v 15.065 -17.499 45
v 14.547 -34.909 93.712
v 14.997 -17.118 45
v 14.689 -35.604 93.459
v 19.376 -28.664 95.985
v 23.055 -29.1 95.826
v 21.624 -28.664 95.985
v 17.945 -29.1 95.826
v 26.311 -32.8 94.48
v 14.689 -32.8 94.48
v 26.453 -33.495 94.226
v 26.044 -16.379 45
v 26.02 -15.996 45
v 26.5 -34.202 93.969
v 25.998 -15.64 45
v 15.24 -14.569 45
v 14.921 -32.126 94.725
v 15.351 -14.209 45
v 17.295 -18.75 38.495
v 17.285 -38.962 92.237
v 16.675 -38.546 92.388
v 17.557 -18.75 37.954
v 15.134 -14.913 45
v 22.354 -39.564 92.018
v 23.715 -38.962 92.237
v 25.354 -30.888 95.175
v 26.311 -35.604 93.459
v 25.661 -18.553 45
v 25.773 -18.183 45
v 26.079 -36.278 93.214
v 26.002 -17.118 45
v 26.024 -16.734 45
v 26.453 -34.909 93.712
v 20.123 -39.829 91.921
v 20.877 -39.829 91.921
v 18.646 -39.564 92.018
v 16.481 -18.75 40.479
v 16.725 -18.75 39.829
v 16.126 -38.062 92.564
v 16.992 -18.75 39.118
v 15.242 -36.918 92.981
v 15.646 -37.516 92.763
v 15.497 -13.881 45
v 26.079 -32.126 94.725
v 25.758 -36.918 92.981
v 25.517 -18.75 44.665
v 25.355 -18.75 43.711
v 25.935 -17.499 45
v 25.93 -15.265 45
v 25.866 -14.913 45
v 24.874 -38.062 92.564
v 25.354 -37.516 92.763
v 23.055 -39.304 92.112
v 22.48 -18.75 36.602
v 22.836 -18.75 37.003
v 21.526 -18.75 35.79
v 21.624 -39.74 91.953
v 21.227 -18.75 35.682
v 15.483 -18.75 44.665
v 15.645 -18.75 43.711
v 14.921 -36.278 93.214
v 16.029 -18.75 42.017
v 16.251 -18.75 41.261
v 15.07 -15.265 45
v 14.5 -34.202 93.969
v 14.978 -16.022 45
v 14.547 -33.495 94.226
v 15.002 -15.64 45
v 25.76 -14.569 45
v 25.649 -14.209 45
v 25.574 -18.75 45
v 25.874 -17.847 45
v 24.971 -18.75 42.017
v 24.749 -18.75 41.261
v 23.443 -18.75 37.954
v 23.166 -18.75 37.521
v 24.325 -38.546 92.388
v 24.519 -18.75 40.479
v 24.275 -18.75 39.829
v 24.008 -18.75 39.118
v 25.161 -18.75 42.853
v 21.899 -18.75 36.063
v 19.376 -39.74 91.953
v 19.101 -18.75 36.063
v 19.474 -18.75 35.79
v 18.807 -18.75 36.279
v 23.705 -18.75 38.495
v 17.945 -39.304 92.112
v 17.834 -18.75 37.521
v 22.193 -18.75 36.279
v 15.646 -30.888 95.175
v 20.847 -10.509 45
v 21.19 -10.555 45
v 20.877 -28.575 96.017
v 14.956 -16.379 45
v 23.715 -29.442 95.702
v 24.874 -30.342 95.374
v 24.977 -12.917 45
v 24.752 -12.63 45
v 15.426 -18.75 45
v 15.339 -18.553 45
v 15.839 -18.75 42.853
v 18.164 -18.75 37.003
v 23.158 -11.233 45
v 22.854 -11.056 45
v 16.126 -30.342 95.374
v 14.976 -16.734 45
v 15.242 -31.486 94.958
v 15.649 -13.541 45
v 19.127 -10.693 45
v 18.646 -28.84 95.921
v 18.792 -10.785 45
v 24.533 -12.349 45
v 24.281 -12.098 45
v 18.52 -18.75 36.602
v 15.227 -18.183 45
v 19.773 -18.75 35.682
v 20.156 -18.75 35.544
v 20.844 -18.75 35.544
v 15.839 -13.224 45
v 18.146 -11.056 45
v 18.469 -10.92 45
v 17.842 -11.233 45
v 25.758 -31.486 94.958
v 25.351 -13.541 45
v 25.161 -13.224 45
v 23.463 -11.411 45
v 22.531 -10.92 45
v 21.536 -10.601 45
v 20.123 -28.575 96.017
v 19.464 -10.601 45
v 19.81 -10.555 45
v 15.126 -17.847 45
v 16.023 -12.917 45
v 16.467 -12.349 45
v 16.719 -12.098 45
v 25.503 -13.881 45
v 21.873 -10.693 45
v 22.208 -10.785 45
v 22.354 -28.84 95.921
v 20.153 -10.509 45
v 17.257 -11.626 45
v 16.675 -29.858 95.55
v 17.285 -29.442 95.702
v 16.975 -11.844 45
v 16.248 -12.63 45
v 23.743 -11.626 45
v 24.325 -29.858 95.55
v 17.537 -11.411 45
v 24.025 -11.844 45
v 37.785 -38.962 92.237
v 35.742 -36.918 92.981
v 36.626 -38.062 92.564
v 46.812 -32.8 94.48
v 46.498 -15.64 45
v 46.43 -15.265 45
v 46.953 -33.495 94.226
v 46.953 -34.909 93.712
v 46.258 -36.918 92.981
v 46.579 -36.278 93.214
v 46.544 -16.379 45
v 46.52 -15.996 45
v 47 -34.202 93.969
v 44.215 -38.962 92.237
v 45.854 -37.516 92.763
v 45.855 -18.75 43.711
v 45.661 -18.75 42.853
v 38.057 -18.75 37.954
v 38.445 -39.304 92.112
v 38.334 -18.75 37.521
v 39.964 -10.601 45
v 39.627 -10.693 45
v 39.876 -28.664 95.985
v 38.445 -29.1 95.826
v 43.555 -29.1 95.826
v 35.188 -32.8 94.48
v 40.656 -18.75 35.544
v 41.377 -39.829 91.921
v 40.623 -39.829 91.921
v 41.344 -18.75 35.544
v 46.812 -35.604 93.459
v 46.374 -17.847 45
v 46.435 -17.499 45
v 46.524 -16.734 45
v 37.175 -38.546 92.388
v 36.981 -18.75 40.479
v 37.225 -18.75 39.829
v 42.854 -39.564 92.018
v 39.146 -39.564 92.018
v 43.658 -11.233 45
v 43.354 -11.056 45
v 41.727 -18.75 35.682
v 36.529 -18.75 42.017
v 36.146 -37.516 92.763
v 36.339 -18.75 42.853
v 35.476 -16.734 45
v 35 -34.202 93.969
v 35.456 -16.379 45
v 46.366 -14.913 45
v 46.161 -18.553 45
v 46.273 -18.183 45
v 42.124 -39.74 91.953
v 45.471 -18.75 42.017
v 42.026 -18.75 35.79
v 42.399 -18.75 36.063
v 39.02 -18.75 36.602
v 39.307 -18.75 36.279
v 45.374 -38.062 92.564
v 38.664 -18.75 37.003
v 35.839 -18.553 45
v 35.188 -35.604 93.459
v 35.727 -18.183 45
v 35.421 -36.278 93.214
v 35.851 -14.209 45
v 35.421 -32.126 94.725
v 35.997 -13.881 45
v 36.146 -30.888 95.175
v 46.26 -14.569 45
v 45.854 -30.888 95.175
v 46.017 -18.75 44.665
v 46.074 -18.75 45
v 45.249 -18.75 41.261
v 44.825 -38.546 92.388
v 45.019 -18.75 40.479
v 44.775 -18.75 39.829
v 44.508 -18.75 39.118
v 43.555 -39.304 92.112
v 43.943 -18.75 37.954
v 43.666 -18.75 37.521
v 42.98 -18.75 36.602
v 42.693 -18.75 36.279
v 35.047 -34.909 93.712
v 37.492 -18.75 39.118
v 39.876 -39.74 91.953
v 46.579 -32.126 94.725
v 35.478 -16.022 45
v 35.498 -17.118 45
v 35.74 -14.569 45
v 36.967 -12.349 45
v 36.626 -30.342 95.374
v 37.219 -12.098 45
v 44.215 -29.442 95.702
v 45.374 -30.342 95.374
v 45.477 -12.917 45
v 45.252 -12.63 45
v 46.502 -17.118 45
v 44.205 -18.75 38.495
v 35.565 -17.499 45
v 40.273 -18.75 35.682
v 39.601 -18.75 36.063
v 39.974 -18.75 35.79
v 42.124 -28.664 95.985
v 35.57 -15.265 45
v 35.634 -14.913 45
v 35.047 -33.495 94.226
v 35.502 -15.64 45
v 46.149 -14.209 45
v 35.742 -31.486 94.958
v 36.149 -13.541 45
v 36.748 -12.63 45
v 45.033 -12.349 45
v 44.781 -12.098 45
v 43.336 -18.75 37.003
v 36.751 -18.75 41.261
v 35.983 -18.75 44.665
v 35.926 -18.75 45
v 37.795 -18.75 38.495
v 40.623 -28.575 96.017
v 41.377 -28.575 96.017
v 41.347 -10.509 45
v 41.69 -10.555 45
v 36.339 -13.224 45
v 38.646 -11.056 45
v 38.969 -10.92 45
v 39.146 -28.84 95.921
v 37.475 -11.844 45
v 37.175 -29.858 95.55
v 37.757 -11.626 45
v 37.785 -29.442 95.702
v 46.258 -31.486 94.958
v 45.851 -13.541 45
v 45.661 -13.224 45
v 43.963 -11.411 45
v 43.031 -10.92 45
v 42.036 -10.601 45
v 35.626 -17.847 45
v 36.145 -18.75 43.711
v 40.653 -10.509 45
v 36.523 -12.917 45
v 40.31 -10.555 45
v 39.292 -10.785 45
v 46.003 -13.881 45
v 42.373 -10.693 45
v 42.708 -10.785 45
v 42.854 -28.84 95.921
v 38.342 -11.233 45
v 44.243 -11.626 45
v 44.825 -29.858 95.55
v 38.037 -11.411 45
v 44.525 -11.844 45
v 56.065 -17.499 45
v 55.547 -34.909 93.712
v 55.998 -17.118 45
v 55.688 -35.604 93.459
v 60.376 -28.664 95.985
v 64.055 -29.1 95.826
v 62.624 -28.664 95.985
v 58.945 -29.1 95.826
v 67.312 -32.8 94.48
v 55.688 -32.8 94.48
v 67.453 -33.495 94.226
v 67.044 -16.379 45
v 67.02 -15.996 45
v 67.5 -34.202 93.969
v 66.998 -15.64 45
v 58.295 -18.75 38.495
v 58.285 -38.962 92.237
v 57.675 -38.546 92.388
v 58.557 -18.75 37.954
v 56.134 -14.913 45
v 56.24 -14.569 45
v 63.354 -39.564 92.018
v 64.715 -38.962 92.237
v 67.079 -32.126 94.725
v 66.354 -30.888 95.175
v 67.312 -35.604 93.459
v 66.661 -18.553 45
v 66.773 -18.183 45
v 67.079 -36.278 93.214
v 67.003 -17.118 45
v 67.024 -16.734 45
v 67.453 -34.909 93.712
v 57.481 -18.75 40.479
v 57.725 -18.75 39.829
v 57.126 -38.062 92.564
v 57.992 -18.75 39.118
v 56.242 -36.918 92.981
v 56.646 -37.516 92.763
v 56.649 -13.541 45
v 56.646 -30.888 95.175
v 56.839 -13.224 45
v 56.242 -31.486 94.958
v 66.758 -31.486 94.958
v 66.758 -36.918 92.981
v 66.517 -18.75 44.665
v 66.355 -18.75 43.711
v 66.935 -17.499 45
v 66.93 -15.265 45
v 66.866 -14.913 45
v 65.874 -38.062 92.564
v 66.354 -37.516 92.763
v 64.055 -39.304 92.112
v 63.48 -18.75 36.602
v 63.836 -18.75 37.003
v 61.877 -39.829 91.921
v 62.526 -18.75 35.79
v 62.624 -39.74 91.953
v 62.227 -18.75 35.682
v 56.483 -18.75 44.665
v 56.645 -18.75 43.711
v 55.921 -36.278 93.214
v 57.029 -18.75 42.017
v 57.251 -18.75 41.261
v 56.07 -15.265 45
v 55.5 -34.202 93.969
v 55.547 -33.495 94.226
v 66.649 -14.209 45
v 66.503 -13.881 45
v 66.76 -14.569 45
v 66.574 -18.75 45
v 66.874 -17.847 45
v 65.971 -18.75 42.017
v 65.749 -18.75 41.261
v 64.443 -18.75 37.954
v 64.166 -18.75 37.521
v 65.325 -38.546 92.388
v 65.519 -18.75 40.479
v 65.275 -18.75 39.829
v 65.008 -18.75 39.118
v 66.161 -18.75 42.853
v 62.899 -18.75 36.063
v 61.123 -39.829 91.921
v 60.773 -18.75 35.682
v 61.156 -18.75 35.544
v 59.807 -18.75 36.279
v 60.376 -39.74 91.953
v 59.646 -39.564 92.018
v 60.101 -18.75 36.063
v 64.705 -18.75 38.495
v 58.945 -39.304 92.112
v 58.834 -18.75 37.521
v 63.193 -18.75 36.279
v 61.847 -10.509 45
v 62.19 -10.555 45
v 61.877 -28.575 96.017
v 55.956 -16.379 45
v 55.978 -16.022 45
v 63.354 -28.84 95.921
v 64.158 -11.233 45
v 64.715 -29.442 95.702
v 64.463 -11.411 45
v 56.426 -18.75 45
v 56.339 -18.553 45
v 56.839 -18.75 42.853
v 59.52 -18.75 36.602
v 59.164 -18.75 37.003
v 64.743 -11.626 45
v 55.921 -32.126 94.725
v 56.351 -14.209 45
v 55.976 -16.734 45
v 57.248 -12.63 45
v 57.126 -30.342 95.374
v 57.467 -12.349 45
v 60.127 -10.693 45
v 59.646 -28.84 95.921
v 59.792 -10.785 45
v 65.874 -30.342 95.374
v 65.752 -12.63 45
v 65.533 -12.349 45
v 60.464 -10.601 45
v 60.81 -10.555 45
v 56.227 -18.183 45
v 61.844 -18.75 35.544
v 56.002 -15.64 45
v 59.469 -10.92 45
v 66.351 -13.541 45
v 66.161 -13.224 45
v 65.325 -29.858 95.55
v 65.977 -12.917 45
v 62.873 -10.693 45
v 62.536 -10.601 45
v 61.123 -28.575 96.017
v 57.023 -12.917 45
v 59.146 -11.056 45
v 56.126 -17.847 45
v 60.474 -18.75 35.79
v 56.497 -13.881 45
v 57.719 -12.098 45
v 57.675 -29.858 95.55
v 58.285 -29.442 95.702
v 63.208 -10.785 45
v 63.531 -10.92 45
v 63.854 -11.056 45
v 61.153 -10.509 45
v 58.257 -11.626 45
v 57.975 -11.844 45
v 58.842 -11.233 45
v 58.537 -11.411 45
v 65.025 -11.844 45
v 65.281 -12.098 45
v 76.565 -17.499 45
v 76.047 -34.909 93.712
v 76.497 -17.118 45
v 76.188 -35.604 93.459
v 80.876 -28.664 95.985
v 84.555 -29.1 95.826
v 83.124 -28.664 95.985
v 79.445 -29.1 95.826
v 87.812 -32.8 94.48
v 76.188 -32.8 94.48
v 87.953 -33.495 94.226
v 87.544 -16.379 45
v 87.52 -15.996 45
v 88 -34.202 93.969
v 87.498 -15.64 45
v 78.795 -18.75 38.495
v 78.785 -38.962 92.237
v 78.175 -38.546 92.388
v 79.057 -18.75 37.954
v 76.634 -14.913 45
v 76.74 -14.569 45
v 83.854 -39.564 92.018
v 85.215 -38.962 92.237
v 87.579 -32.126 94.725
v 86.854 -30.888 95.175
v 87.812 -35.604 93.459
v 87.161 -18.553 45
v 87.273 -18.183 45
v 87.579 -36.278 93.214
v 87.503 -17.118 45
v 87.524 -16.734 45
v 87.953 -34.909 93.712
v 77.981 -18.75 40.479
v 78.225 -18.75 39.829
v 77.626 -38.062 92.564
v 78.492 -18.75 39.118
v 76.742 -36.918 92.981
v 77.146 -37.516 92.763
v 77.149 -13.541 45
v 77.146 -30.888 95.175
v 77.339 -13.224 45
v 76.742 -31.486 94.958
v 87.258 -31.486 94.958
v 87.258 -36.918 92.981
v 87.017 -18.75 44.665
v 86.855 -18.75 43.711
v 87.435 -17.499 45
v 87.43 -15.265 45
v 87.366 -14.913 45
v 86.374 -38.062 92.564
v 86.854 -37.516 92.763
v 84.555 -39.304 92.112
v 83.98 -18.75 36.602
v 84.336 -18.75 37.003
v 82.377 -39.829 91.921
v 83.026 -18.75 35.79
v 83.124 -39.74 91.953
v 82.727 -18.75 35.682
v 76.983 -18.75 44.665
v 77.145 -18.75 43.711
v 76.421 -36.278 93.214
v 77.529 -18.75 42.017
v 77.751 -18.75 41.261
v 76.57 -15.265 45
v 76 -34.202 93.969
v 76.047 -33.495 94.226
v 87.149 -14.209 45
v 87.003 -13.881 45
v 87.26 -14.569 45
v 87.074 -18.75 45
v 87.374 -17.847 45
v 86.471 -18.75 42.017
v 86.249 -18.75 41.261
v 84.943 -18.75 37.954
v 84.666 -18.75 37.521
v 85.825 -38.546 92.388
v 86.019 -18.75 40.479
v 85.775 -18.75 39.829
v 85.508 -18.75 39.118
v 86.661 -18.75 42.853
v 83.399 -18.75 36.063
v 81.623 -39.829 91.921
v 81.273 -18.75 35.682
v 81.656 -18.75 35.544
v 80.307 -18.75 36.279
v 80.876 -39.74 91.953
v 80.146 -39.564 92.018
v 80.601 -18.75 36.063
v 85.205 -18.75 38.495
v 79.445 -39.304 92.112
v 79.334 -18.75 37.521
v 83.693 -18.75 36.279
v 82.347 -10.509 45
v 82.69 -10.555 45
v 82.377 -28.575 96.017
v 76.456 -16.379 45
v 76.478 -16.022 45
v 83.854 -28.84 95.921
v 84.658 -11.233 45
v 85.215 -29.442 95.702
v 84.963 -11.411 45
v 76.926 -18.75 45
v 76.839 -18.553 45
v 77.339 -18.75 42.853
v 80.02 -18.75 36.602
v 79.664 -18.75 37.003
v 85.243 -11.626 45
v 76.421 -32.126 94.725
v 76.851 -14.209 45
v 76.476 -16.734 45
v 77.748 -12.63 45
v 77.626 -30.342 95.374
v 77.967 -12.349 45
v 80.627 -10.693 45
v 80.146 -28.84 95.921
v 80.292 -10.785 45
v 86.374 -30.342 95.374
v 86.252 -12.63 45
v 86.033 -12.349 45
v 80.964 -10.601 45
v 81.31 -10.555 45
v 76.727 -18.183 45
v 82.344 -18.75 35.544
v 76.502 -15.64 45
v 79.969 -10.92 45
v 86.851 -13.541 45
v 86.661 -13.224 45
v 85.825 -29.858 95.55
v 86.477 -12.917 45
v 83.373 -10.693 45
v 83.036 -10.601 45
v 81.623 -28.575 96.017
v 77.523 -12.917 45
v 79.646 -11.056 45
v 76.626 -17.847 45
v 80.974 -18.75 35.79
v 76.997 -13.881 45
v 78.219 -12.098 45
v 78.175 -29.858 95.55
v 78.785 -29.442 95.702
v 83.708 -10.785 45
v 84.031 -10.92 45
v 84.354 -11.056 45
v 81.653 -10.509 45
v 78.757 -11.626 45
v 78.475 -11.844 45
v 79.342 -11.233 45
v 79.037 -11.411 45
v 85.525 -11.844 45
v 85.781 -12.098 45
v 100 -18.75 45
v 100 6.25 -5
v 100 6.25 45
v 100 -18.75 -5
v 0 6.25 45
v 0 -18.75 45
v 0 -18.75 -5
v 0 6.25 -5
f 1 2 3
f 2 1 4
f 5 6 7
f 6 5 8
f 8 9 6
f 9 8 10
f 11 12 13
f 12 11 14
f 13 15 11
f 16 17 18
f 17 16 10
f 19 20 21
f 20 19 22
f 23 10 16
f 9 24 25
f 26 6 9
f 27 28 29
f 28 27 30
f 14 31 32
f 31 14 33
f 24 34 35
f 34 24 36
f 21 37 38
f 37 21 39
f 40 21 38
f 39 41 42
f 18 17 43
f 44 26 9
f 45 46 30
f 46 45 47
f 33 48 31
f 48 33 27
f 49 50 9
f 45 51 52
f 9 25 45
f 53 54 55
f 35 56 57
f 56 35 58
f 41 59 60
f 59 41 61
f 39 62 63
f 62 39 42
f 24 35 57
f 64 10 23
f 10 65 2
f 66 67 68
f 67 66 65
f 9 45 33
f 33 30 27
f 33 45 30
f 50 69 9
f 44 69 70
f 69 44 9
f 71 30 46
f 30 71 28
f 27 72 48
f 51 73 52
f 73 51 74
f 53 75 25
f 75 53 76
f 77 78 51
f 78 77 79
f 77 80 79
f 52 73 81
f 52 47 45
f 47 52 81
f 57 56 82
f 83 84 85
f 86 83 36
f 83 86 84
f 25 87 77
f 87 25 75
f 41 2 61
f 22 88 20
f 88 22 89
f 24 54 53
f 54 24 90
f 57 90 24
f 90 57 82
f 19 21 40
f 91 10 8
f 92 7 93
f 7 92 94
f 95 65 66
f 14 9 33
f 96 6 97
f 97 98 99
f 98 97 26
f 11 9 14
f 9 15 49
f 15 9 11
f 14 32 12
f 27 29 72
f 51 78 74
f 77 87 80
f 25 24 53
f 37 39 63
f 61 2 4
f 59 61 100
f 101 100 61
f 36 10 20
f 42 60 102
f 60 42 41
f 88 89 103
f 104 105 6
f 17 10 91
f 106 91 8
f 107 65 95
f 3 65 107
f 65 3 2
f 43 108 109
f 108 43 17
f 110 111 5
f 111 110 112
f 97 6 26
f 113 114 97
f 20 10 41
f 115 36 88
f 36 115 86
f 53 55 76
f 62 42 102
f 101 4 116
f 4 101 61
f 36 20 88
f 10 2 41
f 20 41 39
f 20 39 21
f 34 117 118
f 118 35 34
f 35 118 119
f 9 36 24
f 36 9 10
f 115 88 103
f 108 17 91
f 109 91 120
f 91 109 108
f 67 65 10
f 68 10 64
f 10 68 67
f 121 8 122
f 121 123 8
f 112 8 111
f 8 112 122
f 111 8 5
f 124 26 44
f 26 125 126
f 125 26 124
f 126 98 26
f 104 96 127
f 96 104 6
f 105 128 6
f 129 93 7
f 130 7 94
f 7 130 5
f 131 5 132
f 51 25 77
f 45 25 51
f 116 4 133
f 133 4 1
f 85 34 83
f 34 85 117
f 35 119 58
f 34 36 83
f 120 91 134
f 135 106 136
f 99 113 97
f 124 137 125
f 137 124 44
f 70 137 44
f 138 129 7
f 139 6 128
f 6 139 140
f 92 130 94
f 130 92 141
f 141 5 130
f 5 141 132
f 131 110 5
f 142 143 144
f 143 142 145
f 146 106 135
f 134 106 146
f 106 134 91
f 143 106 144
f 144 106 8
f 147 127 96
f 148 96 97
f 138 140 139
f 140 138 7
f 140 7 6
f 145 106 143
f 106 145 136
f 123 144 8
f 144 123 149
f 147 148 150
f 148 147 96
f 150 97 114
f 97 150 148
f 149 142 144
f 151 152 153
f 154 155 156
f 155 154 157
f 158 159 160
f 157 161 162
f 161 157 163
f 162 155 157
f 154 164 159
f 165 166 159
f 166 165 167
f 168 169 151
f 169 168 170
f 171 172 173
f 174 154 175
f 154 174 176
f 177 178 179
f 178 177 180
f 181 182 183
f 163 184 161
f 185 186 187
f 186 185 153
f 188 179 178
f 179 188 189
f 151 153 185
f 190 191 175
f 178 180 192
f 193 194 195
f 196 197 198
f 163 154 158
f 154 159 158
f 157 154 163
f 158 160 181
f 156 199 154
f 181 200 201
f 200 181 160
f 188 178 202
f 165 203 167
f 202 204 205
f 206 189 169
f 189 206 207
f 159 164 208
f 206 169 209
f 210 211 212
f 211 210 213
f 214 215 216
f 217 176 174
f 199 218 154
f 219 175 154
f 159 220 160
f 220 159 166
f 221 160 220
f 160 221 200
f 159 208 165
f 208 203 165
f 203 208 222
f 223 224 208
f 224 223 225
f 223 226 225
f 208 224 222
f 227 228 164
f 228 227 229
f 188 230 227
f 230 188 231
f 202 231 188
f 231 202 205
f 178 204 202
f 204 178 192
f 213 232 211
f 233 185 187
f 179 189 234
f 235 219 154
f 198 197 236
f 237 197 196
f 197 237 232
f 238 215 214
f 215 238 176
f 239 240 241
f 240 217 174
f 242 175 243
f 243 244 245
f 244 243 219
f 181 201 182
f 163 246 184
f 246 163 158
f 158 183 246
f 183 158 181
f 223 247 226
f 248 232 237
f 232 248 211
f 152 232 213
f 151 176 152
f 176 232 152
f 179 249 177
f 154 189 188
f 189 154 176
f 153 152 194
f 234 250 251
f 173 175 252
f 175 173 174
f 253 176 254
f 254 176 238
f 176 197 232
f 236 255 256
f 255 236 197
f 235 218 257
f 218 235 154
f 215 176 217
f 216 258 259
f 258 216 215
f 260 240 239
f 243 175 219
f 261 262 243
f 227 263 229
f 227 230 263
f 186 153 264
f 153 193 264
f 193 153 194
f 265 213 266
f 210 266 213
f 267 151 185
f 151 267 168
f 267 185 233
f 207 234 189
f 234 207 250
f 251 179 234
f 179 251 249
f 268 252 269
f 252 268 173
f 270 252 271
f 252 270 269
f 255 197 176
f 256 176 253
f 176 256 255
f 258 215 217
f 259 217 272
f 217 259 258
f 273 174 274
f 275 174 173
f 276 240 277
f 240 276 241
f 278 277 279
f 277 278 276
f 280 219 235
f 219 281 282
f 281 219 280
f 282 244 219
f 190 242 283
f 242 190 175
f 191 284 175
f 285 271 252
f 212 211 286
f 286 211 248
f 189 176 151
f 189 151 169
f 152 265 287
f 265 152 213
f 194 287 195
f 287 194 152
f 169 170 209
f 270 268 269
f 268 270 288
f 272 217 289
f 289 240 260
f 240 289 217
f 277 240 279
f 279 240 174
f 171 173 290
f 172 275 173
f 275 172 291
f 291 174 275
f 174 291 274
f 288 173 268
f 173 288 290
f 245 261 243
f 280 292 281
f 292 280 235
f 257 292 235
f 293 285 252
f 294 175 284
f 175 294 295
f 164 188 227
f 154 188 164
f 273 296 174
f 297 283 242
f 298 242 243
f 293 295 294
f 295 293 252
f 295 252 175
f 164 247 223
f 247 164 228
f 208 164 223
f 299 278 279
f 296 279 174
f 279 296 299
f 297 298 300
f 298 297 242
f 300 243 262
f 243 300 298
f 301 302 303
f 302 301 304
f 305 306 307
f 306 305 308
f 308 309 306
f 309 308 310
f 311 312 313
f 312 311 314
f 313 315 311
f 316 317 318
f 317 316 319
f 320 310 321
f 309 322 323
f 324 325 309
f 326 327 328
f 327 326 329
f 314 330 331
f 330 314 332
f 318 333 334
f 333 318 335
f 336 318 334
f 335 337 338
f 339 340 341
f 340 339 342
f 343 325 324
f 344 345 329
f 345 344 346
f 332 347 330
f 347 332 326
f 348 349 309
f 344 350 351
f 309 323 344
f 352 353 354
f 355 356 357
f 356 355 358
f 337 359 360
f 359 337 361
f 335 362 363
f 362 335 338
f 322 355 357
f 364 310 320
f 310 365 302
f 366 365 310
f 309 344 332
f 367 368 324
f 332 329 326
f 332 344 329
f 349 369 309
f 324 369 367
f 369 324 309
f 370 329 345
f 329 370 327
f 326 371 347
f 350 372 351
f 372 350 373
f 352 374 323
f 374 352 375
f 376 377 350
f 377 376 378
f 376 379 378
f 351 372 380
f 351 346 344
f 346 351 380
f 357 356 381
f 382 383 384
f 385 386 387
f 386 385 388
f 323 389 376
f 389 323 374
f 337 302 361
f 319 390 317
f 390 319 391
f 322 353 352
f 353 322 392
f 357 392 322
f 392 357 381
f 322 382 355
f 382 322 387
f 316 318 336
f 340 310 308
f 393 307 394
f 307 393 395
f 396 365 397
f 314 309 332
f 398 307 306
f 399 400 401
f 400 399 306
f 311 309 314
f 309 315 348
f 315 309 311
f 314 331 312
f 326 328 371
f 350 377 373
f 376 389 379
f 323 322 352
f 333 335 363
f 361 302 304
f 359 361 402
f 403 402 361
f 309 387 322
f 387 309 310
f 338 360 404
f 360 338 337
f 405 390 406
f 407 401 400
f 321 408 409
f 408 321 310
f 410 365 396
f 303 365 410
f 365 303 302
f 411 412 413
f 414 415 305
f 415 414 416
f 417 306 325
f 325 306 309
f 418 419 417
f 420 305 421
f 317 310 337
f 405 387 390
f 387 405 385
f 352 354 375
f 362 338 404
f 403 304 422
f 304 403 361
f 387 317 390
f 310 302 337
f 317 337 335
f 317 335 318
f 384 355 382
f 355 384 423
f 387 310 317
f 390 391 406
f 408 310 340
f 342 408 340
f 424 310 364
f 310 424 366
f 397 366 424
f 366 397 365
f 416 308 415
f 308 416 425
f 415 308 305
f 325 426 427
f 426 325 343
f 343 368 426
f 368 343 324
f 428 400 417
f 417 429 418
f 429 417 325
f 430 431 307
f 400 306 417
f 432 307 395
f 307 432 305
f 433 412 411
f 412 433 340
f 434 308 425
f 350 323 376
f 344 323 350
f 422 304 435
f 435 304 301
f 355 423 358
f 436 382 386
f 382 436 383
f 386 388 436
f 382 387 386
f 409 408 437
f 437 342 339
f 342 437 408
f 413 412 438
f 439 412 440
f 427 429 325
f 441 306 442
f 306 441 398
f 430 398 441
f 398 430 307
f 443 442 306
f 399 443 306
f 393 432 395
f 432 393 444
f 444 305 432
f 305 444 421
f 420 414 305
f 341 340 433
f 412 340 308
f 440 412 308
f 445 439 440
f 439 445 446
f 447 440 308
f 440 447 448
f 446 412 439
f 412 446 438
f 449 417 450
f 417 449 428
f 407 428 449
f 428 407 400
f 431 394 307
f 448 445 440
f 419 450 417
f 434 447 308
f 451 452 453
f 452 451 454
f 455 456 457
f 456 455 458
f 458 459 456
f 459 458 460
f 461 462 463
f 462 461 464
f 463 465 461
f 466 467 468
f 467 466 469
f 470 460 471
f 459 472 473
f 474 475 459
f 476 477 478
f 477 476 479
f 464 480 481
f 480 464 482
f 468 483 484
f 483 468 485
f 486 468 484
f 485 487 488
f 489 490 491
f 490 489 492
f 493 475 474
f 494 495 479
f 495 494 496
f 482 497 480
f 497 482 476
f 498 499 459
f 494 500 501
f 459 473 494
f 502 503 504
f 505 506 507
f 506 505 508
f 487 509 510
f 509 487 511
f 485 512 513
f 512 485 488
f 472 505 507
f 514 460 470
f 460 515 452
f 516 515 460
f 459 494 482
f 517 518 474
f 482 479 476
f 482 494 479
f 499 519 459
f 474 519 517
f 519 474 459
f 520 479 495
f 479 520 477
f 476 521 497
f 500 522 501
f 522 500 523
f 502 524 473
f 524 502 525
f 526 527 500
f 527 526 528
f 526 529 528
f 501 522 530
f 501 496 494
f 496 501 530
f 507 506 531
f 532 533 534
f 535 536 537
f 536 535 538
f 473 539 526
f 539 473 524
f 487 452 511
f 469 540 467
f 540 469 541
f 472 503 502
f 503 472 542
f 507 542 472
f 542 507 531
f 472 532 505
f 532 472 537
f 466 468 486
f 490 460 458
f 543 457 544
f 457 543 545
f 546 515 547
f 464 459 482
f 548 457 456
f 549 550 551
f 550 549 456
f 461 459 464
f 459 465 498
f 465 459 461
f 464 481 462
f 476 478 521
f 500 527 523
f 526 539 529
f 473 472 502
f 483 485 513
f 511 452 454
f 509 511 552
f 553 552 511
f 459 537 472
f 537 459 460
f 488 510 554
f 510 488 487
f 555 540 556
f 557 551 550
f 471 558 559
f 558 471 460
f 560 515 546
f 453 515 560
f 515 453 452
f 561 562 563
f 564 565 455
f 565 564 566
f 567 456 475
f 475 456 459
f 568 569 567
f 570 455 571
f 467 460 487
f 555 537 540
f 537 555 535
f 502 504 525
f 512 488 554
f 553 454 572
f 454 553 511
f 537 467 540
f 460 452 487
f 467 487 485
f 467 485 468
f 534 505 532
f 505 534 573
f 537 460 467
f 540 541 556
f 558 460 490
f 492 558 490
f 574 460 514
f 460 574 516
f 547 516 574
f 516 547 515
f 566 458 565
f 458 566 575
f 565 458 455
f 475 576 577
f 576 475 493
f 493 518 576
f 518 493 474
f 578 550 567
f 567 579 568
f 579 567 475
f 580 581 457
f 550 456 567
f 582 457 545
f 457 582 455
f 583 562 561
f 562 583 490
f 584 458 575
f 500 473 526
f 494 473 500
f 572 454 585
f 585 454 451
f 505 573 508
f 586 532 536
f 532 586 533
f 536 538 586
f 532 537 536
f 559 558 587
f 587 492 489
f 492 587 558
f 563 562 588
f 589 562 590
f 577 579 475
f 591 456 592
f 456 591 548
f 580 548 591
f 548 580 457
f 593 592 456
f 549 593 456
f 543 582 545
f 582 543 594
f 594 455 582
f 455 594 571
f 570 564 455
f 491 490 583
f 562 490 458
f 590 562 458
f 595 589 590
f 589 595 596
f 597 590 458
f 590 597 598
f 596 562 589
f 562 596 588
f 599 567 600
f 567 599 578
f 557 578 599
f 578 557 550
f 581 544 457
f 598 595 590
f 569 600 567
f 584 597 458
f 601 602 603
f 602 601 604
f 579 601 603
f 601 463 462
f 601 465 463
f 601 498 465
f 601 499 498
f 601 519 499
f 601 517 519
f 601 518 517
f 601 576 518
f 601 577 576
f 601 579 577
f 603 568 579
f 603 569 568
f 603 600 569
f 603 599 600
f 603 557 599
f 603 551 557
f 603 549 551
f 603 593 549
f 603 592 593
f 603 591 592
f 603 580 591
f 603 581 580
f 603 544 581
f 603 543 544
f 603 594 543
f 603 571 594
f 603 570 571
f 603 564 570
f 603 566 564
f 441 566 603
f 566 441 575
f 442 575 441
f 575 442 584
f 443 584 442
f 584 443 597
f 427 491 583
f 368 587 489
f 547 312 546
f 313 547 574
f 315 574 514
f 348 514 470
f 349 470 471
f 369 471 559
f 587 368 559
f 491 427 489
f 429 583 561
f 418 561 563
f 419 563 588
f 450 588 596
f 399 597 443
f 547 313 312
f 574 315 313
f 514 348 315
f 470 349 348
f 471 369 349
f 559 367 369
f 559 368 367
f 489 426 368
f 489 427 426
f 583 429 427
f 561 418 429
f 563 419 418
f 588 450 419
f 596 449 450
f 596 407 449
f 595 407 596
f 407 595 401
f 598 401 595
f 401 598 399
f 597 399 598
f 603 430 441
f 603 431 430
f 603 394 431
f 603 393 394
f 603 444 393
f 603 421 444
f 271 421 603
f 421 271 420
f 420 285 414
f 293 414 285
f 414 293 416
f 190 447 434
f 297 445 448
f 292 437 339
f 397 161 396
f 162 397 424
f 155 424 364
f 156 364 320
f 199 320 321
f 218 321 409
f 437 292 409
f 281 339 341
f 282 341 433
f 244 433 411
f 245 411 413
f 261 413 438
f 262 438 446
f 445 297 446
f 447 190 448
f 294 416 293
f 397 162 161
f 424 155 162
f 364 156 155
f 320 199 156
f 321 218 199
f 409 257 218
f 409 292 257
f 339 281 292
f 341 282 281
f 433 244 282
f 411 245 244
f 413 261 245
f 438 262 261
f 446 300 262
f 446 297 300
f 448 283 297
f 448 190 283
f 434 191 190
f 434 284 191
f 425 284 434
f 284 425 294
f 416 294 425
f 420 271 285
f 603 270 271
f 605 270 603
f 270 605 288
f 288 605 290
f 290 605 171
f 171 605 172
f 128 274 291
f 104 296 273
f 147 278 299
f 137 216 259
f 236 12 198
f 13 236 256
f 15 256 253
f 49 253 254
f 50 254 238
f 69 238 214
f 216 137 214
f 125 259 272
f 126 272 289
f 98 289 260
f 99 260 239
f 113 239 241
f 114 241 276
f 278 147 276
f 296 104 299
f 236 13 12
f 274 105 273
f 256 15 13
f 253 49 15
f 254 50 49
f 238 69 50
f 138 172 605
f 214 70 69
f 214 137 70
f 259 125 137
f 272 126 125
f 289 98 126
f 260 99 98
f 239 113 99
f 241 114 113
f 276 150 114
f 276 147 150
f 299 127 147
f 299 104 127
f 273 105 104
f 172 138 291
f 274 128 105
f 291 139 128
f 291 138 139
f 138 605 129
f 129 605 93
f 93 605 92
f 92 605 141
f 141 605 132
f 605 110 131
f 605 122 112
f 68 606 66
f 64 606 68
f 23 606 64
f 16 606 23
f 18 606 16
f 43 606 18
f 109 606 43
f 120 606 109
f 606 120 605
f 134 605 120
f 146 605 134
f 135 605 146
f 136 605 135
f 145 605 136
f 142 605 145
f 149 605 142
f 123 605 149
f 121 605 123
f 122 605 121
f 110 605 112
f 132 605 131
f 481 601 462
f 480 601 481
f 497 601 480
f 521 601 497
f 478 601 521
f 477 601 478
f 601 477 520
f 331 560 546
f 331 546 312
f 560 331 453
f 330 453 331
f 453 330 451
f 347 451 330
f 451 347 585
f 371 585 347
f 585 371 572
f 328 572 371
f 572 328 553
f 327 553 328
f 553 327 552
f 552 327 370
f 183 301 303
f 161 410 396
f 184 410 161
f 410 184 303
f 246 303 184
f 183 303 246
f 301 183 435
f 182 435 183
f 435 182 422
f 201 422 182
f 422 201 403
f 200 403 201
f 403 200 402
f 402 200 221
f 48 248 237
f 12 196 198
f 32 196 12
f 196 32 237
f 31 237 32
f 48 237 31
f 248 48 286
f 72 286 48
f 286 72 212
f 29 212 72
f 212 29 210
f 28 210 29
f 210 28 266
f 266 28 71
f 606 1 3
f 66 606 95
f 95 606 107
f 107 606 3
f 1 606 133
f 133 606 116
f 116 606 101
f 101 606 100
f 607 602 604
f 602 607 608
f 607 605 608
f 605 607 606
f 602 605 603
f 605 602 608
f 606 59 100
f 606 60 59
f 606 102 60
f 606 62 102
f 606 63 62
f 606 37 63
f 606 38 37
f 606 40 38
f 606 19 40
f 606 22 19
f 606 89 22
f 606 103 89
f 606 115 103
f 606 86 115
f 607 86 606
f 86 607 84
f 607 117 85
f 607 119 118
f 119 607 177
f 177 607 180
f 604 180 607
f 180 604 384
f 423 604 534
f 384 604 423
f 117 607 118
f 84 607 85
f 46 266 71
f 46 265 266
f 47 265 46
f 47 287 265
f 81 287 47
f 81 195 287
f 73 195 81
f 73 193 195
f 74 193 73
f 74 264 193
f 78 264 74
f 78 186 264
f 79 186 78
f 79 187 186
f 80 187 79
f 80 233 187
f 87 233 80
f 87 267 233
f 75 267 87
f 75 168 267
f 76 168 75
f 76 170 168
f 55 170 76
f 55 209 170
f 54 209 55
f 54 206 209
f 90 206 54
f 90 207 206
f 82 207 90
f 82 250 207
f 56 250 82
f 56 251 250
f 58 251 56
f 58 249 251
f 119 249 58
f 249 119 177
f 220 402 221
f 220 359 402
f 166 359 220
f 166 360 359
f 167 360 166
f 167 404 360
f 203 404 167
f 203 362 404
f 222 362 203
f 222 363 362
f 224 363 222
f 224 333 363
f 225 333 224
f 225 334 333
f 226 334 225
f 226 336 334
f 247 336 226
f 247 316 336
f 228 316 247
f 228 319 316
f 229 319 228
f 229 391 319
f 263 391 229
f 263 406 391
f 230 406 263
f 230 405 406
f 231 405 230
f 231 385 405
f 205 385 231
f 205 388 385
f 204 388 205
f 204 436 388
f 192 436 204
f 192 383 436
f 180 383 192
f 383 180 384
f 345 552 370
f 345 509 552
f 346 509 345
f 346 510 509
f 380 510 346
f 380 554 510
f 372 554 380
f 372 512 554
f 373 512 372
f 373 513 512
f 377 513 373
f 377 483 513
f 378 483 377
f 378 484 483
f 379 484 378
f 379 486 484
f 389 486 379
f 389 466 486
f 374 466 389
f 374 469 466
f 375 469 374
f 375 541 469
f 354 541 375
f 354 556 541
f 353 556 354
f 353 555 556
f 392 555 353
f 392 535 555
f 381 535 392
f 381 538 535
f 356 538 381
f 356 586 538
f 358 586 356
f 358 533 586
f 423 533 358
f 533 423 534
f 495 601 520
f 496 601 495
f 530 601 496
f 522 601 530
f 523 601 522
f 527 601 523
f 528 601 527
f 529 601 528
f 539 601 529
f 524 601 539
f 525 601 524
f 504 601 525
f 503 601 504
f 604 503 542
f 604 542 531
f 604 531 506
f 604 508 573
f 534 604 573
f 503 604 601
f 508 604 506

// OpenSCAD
$fn=50;
PEN_DIA_TOP=12;
PEN_DIA_BOTTOM=10.25;

PEN_HEIGHT= 100; //40;

module make_pens()
{
    for (pen=[ 1 : 4])
    {
        location =(PEN_DIA_BOTTOM * 1.5 + PEN_DIA_BOTTOM/2) * pen;

        echo ("pen = ", pen, " location = ", location + PEN_DIA_BOTTOM/2); // max RHS
       
        translate ( [location, 0, 0 ])
        rotate( [ 20, 0, 0])
        cylinder(h = PEN_HEIGHT, r1 = PEN_DIA_BOTTOM/2, r2 = PEN_DIA_TOP/2);
        
        echo ("RHS = ", location + PEN_DIA_BOTTOM);
    }   
}

BOX_THICK = 25;
BOX_LENGTH = 92.5;
module make_box()
{
    translate([ 0, -BOX_THICK * 3/4, -5 ])
    color("GREEN", .3)
    cube( [100, BOX_THICK , 50]);
}

make_pens();
make_box();
